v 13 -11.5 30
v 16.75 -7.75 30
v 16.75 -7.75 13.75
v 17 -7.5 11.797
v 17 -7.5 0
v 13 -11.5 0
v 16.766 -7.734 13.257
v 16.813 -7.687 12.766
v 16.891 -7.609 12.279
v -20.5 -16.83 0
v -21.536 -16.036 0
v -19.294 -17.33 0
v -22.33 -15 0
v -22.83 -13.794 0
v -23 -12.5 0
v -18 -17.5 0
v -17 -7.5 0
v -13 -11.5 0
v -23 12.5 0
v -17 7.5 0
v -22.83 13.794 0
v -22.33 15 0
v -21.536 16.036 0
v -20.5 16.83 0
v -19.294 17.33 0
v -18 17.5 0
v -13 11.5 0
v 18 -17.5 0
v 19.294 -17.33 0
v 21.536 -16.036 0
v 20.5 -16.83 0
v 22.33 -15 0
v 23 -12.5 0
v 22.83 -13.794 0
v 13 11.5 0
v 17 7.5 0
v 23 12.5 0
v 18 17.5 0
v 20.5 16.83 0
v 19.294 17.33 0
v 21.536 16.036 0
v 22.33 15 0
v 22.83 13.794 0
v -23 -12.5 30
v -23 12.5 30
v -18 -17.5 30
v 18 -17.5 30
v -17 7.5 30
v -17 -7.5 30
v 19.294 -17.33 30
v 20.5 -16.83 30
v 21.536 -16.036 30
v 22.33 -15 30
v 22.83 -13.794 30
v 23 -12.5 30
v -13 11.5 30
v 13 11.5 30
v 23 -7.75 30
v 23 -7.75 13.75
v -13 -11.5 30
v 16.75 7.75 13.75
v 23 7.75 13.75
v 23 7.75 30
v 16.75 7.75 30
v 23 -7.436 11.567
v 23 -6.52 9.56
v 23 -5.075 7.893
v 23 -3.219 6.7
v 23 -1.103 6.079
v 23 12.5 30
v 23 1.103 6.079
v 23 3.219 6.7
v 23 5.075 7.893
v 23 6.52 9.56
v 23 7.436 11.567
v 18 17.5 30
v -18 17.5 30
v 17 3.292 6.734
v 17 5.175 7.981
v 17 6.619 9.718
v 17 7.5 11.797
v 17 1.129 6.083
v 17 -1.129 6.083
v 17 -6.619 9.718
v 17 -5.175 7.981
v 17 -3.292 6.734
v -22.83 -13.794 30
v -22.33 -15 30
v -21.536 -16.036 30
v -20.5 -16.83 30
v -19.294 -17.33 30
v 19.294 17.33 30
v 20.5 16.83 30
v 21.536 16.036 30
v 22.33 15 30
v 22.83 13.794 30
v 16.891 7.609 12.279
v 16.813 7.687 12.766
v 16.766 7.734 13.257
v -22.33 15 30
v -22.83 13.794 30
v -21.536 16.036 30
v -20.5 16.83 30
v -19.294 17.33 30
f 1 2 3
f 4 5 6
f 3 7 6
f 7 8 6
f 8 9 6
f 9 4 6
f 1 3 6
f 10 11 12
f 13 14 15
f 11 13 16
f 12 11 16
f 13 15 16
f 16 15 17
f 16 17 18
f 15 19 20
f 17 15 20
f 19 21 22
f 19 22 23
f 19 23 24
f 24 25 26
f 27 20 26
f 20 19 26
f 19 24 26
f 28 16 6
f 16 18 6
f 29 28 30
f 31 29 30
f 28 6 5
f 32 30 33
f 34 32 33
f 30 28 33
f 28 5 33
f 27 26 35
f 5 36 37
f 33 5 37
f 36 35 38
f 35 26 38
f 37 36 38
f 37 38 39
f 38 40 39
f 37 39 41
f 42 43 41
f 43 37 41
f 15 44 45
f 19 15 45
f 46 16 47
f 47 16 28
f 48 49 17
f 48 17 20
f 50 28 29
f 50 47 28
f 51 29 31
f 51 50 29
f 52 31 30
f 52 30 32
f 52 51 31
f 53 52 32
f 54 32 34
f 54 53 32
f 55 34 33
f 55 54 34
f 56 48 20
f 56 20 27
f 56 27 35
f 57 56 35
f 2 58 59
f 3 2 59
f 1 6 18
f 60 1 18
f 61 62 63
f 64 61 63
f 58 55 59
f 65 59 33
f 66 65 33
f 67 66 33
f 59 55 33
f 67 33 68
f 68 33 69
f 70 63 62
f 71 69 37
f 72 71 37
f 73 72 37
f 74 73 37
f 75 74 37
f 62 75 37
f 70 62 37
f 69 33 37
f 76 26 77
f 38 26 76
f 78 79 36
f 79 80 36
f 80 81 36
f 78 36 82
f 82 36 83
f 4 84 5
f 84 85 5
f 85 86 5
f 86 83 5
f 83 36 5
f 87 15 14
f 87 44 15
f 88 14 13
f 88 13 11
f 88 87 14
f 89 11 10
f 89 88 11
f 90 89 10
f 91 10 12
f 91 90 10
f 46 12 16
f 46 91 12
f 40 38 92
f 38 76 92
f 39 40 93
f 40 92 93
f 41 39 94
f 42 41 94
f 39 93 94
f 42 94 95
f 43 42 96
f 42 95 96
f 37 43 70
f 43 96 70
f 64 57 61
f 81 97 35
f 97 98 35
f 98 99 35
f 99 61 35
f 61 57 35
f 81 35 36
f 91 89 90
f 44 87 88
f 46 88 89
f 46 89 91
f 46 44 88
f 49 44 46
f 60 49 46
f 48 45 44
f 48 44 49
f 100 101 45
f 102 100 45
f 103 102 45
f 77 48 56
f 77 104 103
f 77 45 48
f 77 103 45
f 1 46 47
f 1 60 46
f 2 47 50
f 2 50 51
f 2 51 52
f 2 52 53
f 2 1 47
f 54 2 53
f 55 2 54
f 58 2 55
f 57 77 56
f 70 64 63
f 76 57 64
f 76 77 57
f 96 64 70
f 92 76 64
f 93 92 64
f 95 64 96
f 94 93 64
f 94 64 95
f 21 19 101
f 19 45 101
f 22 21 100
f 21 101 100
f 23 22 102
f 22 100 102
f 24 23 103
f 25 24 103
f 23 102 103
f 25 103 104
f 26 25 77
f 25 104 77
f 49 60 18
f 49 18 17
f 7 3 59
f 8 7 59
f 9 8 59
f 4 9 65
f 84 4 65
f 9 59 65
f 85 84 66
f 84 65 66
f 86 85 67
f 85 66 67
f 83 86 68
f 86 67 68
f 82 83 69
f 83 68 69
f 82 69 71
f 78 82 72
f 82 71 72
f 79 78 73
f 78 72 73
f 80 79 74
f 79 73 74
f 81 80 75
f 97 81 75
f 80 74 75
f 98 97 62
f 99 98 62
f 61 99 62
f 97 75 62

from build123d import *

# Parameters (mm, degrees)
F0_W     = 46
F0_H     = 35
F1_DEPTH = 30
F3_DEPTH = 6.251
F4_R     = 5


with BuildPart() as f1:
    # F0 (on Top) → F1 (new body)
    with BuildSketch(Plane.XY):
        Rectangle(F0_W, F0_H)
        Polygon((-17, 7.5), (-13, 11.5), (13, 11.5), (17, 7.5), (17, -7.5), (13, -11.5), (-13, -11.5), (-17, -7.5), align=None, mode=Mode.SUBTRACT)
    extrude(amount=F1_DEPTH)

    # F2 (on face) → F3 (cut, through all)
    with BuildSketch(Plane.YZ.offset(23)):
        with BuildLine():
            Line((-7.75, 30), (-7.75, 13.75))
            ThreePointArc((-7.75, 13.75), (0, 6), (7.75, 13.75))
            Line((7.75, 13.75), (7.75, 30))
            Line((7.75, 30), (-7.75, 30))
        make_face()
    extrude(amount=-F3_DEPTH, mode=Mode.SUBTRACT)

    # F4
    f4_edges = [f1.edges().sort_by_distance(p)[0] for p in [
        (23, -17.5, 15),
        (23, 17.5, 15),
        (-23, 17.5, 15),
        (-23, -17.5, 15),
    ]]
    fillet(f4_edges, radius=F4_R)


solid = f1.part
